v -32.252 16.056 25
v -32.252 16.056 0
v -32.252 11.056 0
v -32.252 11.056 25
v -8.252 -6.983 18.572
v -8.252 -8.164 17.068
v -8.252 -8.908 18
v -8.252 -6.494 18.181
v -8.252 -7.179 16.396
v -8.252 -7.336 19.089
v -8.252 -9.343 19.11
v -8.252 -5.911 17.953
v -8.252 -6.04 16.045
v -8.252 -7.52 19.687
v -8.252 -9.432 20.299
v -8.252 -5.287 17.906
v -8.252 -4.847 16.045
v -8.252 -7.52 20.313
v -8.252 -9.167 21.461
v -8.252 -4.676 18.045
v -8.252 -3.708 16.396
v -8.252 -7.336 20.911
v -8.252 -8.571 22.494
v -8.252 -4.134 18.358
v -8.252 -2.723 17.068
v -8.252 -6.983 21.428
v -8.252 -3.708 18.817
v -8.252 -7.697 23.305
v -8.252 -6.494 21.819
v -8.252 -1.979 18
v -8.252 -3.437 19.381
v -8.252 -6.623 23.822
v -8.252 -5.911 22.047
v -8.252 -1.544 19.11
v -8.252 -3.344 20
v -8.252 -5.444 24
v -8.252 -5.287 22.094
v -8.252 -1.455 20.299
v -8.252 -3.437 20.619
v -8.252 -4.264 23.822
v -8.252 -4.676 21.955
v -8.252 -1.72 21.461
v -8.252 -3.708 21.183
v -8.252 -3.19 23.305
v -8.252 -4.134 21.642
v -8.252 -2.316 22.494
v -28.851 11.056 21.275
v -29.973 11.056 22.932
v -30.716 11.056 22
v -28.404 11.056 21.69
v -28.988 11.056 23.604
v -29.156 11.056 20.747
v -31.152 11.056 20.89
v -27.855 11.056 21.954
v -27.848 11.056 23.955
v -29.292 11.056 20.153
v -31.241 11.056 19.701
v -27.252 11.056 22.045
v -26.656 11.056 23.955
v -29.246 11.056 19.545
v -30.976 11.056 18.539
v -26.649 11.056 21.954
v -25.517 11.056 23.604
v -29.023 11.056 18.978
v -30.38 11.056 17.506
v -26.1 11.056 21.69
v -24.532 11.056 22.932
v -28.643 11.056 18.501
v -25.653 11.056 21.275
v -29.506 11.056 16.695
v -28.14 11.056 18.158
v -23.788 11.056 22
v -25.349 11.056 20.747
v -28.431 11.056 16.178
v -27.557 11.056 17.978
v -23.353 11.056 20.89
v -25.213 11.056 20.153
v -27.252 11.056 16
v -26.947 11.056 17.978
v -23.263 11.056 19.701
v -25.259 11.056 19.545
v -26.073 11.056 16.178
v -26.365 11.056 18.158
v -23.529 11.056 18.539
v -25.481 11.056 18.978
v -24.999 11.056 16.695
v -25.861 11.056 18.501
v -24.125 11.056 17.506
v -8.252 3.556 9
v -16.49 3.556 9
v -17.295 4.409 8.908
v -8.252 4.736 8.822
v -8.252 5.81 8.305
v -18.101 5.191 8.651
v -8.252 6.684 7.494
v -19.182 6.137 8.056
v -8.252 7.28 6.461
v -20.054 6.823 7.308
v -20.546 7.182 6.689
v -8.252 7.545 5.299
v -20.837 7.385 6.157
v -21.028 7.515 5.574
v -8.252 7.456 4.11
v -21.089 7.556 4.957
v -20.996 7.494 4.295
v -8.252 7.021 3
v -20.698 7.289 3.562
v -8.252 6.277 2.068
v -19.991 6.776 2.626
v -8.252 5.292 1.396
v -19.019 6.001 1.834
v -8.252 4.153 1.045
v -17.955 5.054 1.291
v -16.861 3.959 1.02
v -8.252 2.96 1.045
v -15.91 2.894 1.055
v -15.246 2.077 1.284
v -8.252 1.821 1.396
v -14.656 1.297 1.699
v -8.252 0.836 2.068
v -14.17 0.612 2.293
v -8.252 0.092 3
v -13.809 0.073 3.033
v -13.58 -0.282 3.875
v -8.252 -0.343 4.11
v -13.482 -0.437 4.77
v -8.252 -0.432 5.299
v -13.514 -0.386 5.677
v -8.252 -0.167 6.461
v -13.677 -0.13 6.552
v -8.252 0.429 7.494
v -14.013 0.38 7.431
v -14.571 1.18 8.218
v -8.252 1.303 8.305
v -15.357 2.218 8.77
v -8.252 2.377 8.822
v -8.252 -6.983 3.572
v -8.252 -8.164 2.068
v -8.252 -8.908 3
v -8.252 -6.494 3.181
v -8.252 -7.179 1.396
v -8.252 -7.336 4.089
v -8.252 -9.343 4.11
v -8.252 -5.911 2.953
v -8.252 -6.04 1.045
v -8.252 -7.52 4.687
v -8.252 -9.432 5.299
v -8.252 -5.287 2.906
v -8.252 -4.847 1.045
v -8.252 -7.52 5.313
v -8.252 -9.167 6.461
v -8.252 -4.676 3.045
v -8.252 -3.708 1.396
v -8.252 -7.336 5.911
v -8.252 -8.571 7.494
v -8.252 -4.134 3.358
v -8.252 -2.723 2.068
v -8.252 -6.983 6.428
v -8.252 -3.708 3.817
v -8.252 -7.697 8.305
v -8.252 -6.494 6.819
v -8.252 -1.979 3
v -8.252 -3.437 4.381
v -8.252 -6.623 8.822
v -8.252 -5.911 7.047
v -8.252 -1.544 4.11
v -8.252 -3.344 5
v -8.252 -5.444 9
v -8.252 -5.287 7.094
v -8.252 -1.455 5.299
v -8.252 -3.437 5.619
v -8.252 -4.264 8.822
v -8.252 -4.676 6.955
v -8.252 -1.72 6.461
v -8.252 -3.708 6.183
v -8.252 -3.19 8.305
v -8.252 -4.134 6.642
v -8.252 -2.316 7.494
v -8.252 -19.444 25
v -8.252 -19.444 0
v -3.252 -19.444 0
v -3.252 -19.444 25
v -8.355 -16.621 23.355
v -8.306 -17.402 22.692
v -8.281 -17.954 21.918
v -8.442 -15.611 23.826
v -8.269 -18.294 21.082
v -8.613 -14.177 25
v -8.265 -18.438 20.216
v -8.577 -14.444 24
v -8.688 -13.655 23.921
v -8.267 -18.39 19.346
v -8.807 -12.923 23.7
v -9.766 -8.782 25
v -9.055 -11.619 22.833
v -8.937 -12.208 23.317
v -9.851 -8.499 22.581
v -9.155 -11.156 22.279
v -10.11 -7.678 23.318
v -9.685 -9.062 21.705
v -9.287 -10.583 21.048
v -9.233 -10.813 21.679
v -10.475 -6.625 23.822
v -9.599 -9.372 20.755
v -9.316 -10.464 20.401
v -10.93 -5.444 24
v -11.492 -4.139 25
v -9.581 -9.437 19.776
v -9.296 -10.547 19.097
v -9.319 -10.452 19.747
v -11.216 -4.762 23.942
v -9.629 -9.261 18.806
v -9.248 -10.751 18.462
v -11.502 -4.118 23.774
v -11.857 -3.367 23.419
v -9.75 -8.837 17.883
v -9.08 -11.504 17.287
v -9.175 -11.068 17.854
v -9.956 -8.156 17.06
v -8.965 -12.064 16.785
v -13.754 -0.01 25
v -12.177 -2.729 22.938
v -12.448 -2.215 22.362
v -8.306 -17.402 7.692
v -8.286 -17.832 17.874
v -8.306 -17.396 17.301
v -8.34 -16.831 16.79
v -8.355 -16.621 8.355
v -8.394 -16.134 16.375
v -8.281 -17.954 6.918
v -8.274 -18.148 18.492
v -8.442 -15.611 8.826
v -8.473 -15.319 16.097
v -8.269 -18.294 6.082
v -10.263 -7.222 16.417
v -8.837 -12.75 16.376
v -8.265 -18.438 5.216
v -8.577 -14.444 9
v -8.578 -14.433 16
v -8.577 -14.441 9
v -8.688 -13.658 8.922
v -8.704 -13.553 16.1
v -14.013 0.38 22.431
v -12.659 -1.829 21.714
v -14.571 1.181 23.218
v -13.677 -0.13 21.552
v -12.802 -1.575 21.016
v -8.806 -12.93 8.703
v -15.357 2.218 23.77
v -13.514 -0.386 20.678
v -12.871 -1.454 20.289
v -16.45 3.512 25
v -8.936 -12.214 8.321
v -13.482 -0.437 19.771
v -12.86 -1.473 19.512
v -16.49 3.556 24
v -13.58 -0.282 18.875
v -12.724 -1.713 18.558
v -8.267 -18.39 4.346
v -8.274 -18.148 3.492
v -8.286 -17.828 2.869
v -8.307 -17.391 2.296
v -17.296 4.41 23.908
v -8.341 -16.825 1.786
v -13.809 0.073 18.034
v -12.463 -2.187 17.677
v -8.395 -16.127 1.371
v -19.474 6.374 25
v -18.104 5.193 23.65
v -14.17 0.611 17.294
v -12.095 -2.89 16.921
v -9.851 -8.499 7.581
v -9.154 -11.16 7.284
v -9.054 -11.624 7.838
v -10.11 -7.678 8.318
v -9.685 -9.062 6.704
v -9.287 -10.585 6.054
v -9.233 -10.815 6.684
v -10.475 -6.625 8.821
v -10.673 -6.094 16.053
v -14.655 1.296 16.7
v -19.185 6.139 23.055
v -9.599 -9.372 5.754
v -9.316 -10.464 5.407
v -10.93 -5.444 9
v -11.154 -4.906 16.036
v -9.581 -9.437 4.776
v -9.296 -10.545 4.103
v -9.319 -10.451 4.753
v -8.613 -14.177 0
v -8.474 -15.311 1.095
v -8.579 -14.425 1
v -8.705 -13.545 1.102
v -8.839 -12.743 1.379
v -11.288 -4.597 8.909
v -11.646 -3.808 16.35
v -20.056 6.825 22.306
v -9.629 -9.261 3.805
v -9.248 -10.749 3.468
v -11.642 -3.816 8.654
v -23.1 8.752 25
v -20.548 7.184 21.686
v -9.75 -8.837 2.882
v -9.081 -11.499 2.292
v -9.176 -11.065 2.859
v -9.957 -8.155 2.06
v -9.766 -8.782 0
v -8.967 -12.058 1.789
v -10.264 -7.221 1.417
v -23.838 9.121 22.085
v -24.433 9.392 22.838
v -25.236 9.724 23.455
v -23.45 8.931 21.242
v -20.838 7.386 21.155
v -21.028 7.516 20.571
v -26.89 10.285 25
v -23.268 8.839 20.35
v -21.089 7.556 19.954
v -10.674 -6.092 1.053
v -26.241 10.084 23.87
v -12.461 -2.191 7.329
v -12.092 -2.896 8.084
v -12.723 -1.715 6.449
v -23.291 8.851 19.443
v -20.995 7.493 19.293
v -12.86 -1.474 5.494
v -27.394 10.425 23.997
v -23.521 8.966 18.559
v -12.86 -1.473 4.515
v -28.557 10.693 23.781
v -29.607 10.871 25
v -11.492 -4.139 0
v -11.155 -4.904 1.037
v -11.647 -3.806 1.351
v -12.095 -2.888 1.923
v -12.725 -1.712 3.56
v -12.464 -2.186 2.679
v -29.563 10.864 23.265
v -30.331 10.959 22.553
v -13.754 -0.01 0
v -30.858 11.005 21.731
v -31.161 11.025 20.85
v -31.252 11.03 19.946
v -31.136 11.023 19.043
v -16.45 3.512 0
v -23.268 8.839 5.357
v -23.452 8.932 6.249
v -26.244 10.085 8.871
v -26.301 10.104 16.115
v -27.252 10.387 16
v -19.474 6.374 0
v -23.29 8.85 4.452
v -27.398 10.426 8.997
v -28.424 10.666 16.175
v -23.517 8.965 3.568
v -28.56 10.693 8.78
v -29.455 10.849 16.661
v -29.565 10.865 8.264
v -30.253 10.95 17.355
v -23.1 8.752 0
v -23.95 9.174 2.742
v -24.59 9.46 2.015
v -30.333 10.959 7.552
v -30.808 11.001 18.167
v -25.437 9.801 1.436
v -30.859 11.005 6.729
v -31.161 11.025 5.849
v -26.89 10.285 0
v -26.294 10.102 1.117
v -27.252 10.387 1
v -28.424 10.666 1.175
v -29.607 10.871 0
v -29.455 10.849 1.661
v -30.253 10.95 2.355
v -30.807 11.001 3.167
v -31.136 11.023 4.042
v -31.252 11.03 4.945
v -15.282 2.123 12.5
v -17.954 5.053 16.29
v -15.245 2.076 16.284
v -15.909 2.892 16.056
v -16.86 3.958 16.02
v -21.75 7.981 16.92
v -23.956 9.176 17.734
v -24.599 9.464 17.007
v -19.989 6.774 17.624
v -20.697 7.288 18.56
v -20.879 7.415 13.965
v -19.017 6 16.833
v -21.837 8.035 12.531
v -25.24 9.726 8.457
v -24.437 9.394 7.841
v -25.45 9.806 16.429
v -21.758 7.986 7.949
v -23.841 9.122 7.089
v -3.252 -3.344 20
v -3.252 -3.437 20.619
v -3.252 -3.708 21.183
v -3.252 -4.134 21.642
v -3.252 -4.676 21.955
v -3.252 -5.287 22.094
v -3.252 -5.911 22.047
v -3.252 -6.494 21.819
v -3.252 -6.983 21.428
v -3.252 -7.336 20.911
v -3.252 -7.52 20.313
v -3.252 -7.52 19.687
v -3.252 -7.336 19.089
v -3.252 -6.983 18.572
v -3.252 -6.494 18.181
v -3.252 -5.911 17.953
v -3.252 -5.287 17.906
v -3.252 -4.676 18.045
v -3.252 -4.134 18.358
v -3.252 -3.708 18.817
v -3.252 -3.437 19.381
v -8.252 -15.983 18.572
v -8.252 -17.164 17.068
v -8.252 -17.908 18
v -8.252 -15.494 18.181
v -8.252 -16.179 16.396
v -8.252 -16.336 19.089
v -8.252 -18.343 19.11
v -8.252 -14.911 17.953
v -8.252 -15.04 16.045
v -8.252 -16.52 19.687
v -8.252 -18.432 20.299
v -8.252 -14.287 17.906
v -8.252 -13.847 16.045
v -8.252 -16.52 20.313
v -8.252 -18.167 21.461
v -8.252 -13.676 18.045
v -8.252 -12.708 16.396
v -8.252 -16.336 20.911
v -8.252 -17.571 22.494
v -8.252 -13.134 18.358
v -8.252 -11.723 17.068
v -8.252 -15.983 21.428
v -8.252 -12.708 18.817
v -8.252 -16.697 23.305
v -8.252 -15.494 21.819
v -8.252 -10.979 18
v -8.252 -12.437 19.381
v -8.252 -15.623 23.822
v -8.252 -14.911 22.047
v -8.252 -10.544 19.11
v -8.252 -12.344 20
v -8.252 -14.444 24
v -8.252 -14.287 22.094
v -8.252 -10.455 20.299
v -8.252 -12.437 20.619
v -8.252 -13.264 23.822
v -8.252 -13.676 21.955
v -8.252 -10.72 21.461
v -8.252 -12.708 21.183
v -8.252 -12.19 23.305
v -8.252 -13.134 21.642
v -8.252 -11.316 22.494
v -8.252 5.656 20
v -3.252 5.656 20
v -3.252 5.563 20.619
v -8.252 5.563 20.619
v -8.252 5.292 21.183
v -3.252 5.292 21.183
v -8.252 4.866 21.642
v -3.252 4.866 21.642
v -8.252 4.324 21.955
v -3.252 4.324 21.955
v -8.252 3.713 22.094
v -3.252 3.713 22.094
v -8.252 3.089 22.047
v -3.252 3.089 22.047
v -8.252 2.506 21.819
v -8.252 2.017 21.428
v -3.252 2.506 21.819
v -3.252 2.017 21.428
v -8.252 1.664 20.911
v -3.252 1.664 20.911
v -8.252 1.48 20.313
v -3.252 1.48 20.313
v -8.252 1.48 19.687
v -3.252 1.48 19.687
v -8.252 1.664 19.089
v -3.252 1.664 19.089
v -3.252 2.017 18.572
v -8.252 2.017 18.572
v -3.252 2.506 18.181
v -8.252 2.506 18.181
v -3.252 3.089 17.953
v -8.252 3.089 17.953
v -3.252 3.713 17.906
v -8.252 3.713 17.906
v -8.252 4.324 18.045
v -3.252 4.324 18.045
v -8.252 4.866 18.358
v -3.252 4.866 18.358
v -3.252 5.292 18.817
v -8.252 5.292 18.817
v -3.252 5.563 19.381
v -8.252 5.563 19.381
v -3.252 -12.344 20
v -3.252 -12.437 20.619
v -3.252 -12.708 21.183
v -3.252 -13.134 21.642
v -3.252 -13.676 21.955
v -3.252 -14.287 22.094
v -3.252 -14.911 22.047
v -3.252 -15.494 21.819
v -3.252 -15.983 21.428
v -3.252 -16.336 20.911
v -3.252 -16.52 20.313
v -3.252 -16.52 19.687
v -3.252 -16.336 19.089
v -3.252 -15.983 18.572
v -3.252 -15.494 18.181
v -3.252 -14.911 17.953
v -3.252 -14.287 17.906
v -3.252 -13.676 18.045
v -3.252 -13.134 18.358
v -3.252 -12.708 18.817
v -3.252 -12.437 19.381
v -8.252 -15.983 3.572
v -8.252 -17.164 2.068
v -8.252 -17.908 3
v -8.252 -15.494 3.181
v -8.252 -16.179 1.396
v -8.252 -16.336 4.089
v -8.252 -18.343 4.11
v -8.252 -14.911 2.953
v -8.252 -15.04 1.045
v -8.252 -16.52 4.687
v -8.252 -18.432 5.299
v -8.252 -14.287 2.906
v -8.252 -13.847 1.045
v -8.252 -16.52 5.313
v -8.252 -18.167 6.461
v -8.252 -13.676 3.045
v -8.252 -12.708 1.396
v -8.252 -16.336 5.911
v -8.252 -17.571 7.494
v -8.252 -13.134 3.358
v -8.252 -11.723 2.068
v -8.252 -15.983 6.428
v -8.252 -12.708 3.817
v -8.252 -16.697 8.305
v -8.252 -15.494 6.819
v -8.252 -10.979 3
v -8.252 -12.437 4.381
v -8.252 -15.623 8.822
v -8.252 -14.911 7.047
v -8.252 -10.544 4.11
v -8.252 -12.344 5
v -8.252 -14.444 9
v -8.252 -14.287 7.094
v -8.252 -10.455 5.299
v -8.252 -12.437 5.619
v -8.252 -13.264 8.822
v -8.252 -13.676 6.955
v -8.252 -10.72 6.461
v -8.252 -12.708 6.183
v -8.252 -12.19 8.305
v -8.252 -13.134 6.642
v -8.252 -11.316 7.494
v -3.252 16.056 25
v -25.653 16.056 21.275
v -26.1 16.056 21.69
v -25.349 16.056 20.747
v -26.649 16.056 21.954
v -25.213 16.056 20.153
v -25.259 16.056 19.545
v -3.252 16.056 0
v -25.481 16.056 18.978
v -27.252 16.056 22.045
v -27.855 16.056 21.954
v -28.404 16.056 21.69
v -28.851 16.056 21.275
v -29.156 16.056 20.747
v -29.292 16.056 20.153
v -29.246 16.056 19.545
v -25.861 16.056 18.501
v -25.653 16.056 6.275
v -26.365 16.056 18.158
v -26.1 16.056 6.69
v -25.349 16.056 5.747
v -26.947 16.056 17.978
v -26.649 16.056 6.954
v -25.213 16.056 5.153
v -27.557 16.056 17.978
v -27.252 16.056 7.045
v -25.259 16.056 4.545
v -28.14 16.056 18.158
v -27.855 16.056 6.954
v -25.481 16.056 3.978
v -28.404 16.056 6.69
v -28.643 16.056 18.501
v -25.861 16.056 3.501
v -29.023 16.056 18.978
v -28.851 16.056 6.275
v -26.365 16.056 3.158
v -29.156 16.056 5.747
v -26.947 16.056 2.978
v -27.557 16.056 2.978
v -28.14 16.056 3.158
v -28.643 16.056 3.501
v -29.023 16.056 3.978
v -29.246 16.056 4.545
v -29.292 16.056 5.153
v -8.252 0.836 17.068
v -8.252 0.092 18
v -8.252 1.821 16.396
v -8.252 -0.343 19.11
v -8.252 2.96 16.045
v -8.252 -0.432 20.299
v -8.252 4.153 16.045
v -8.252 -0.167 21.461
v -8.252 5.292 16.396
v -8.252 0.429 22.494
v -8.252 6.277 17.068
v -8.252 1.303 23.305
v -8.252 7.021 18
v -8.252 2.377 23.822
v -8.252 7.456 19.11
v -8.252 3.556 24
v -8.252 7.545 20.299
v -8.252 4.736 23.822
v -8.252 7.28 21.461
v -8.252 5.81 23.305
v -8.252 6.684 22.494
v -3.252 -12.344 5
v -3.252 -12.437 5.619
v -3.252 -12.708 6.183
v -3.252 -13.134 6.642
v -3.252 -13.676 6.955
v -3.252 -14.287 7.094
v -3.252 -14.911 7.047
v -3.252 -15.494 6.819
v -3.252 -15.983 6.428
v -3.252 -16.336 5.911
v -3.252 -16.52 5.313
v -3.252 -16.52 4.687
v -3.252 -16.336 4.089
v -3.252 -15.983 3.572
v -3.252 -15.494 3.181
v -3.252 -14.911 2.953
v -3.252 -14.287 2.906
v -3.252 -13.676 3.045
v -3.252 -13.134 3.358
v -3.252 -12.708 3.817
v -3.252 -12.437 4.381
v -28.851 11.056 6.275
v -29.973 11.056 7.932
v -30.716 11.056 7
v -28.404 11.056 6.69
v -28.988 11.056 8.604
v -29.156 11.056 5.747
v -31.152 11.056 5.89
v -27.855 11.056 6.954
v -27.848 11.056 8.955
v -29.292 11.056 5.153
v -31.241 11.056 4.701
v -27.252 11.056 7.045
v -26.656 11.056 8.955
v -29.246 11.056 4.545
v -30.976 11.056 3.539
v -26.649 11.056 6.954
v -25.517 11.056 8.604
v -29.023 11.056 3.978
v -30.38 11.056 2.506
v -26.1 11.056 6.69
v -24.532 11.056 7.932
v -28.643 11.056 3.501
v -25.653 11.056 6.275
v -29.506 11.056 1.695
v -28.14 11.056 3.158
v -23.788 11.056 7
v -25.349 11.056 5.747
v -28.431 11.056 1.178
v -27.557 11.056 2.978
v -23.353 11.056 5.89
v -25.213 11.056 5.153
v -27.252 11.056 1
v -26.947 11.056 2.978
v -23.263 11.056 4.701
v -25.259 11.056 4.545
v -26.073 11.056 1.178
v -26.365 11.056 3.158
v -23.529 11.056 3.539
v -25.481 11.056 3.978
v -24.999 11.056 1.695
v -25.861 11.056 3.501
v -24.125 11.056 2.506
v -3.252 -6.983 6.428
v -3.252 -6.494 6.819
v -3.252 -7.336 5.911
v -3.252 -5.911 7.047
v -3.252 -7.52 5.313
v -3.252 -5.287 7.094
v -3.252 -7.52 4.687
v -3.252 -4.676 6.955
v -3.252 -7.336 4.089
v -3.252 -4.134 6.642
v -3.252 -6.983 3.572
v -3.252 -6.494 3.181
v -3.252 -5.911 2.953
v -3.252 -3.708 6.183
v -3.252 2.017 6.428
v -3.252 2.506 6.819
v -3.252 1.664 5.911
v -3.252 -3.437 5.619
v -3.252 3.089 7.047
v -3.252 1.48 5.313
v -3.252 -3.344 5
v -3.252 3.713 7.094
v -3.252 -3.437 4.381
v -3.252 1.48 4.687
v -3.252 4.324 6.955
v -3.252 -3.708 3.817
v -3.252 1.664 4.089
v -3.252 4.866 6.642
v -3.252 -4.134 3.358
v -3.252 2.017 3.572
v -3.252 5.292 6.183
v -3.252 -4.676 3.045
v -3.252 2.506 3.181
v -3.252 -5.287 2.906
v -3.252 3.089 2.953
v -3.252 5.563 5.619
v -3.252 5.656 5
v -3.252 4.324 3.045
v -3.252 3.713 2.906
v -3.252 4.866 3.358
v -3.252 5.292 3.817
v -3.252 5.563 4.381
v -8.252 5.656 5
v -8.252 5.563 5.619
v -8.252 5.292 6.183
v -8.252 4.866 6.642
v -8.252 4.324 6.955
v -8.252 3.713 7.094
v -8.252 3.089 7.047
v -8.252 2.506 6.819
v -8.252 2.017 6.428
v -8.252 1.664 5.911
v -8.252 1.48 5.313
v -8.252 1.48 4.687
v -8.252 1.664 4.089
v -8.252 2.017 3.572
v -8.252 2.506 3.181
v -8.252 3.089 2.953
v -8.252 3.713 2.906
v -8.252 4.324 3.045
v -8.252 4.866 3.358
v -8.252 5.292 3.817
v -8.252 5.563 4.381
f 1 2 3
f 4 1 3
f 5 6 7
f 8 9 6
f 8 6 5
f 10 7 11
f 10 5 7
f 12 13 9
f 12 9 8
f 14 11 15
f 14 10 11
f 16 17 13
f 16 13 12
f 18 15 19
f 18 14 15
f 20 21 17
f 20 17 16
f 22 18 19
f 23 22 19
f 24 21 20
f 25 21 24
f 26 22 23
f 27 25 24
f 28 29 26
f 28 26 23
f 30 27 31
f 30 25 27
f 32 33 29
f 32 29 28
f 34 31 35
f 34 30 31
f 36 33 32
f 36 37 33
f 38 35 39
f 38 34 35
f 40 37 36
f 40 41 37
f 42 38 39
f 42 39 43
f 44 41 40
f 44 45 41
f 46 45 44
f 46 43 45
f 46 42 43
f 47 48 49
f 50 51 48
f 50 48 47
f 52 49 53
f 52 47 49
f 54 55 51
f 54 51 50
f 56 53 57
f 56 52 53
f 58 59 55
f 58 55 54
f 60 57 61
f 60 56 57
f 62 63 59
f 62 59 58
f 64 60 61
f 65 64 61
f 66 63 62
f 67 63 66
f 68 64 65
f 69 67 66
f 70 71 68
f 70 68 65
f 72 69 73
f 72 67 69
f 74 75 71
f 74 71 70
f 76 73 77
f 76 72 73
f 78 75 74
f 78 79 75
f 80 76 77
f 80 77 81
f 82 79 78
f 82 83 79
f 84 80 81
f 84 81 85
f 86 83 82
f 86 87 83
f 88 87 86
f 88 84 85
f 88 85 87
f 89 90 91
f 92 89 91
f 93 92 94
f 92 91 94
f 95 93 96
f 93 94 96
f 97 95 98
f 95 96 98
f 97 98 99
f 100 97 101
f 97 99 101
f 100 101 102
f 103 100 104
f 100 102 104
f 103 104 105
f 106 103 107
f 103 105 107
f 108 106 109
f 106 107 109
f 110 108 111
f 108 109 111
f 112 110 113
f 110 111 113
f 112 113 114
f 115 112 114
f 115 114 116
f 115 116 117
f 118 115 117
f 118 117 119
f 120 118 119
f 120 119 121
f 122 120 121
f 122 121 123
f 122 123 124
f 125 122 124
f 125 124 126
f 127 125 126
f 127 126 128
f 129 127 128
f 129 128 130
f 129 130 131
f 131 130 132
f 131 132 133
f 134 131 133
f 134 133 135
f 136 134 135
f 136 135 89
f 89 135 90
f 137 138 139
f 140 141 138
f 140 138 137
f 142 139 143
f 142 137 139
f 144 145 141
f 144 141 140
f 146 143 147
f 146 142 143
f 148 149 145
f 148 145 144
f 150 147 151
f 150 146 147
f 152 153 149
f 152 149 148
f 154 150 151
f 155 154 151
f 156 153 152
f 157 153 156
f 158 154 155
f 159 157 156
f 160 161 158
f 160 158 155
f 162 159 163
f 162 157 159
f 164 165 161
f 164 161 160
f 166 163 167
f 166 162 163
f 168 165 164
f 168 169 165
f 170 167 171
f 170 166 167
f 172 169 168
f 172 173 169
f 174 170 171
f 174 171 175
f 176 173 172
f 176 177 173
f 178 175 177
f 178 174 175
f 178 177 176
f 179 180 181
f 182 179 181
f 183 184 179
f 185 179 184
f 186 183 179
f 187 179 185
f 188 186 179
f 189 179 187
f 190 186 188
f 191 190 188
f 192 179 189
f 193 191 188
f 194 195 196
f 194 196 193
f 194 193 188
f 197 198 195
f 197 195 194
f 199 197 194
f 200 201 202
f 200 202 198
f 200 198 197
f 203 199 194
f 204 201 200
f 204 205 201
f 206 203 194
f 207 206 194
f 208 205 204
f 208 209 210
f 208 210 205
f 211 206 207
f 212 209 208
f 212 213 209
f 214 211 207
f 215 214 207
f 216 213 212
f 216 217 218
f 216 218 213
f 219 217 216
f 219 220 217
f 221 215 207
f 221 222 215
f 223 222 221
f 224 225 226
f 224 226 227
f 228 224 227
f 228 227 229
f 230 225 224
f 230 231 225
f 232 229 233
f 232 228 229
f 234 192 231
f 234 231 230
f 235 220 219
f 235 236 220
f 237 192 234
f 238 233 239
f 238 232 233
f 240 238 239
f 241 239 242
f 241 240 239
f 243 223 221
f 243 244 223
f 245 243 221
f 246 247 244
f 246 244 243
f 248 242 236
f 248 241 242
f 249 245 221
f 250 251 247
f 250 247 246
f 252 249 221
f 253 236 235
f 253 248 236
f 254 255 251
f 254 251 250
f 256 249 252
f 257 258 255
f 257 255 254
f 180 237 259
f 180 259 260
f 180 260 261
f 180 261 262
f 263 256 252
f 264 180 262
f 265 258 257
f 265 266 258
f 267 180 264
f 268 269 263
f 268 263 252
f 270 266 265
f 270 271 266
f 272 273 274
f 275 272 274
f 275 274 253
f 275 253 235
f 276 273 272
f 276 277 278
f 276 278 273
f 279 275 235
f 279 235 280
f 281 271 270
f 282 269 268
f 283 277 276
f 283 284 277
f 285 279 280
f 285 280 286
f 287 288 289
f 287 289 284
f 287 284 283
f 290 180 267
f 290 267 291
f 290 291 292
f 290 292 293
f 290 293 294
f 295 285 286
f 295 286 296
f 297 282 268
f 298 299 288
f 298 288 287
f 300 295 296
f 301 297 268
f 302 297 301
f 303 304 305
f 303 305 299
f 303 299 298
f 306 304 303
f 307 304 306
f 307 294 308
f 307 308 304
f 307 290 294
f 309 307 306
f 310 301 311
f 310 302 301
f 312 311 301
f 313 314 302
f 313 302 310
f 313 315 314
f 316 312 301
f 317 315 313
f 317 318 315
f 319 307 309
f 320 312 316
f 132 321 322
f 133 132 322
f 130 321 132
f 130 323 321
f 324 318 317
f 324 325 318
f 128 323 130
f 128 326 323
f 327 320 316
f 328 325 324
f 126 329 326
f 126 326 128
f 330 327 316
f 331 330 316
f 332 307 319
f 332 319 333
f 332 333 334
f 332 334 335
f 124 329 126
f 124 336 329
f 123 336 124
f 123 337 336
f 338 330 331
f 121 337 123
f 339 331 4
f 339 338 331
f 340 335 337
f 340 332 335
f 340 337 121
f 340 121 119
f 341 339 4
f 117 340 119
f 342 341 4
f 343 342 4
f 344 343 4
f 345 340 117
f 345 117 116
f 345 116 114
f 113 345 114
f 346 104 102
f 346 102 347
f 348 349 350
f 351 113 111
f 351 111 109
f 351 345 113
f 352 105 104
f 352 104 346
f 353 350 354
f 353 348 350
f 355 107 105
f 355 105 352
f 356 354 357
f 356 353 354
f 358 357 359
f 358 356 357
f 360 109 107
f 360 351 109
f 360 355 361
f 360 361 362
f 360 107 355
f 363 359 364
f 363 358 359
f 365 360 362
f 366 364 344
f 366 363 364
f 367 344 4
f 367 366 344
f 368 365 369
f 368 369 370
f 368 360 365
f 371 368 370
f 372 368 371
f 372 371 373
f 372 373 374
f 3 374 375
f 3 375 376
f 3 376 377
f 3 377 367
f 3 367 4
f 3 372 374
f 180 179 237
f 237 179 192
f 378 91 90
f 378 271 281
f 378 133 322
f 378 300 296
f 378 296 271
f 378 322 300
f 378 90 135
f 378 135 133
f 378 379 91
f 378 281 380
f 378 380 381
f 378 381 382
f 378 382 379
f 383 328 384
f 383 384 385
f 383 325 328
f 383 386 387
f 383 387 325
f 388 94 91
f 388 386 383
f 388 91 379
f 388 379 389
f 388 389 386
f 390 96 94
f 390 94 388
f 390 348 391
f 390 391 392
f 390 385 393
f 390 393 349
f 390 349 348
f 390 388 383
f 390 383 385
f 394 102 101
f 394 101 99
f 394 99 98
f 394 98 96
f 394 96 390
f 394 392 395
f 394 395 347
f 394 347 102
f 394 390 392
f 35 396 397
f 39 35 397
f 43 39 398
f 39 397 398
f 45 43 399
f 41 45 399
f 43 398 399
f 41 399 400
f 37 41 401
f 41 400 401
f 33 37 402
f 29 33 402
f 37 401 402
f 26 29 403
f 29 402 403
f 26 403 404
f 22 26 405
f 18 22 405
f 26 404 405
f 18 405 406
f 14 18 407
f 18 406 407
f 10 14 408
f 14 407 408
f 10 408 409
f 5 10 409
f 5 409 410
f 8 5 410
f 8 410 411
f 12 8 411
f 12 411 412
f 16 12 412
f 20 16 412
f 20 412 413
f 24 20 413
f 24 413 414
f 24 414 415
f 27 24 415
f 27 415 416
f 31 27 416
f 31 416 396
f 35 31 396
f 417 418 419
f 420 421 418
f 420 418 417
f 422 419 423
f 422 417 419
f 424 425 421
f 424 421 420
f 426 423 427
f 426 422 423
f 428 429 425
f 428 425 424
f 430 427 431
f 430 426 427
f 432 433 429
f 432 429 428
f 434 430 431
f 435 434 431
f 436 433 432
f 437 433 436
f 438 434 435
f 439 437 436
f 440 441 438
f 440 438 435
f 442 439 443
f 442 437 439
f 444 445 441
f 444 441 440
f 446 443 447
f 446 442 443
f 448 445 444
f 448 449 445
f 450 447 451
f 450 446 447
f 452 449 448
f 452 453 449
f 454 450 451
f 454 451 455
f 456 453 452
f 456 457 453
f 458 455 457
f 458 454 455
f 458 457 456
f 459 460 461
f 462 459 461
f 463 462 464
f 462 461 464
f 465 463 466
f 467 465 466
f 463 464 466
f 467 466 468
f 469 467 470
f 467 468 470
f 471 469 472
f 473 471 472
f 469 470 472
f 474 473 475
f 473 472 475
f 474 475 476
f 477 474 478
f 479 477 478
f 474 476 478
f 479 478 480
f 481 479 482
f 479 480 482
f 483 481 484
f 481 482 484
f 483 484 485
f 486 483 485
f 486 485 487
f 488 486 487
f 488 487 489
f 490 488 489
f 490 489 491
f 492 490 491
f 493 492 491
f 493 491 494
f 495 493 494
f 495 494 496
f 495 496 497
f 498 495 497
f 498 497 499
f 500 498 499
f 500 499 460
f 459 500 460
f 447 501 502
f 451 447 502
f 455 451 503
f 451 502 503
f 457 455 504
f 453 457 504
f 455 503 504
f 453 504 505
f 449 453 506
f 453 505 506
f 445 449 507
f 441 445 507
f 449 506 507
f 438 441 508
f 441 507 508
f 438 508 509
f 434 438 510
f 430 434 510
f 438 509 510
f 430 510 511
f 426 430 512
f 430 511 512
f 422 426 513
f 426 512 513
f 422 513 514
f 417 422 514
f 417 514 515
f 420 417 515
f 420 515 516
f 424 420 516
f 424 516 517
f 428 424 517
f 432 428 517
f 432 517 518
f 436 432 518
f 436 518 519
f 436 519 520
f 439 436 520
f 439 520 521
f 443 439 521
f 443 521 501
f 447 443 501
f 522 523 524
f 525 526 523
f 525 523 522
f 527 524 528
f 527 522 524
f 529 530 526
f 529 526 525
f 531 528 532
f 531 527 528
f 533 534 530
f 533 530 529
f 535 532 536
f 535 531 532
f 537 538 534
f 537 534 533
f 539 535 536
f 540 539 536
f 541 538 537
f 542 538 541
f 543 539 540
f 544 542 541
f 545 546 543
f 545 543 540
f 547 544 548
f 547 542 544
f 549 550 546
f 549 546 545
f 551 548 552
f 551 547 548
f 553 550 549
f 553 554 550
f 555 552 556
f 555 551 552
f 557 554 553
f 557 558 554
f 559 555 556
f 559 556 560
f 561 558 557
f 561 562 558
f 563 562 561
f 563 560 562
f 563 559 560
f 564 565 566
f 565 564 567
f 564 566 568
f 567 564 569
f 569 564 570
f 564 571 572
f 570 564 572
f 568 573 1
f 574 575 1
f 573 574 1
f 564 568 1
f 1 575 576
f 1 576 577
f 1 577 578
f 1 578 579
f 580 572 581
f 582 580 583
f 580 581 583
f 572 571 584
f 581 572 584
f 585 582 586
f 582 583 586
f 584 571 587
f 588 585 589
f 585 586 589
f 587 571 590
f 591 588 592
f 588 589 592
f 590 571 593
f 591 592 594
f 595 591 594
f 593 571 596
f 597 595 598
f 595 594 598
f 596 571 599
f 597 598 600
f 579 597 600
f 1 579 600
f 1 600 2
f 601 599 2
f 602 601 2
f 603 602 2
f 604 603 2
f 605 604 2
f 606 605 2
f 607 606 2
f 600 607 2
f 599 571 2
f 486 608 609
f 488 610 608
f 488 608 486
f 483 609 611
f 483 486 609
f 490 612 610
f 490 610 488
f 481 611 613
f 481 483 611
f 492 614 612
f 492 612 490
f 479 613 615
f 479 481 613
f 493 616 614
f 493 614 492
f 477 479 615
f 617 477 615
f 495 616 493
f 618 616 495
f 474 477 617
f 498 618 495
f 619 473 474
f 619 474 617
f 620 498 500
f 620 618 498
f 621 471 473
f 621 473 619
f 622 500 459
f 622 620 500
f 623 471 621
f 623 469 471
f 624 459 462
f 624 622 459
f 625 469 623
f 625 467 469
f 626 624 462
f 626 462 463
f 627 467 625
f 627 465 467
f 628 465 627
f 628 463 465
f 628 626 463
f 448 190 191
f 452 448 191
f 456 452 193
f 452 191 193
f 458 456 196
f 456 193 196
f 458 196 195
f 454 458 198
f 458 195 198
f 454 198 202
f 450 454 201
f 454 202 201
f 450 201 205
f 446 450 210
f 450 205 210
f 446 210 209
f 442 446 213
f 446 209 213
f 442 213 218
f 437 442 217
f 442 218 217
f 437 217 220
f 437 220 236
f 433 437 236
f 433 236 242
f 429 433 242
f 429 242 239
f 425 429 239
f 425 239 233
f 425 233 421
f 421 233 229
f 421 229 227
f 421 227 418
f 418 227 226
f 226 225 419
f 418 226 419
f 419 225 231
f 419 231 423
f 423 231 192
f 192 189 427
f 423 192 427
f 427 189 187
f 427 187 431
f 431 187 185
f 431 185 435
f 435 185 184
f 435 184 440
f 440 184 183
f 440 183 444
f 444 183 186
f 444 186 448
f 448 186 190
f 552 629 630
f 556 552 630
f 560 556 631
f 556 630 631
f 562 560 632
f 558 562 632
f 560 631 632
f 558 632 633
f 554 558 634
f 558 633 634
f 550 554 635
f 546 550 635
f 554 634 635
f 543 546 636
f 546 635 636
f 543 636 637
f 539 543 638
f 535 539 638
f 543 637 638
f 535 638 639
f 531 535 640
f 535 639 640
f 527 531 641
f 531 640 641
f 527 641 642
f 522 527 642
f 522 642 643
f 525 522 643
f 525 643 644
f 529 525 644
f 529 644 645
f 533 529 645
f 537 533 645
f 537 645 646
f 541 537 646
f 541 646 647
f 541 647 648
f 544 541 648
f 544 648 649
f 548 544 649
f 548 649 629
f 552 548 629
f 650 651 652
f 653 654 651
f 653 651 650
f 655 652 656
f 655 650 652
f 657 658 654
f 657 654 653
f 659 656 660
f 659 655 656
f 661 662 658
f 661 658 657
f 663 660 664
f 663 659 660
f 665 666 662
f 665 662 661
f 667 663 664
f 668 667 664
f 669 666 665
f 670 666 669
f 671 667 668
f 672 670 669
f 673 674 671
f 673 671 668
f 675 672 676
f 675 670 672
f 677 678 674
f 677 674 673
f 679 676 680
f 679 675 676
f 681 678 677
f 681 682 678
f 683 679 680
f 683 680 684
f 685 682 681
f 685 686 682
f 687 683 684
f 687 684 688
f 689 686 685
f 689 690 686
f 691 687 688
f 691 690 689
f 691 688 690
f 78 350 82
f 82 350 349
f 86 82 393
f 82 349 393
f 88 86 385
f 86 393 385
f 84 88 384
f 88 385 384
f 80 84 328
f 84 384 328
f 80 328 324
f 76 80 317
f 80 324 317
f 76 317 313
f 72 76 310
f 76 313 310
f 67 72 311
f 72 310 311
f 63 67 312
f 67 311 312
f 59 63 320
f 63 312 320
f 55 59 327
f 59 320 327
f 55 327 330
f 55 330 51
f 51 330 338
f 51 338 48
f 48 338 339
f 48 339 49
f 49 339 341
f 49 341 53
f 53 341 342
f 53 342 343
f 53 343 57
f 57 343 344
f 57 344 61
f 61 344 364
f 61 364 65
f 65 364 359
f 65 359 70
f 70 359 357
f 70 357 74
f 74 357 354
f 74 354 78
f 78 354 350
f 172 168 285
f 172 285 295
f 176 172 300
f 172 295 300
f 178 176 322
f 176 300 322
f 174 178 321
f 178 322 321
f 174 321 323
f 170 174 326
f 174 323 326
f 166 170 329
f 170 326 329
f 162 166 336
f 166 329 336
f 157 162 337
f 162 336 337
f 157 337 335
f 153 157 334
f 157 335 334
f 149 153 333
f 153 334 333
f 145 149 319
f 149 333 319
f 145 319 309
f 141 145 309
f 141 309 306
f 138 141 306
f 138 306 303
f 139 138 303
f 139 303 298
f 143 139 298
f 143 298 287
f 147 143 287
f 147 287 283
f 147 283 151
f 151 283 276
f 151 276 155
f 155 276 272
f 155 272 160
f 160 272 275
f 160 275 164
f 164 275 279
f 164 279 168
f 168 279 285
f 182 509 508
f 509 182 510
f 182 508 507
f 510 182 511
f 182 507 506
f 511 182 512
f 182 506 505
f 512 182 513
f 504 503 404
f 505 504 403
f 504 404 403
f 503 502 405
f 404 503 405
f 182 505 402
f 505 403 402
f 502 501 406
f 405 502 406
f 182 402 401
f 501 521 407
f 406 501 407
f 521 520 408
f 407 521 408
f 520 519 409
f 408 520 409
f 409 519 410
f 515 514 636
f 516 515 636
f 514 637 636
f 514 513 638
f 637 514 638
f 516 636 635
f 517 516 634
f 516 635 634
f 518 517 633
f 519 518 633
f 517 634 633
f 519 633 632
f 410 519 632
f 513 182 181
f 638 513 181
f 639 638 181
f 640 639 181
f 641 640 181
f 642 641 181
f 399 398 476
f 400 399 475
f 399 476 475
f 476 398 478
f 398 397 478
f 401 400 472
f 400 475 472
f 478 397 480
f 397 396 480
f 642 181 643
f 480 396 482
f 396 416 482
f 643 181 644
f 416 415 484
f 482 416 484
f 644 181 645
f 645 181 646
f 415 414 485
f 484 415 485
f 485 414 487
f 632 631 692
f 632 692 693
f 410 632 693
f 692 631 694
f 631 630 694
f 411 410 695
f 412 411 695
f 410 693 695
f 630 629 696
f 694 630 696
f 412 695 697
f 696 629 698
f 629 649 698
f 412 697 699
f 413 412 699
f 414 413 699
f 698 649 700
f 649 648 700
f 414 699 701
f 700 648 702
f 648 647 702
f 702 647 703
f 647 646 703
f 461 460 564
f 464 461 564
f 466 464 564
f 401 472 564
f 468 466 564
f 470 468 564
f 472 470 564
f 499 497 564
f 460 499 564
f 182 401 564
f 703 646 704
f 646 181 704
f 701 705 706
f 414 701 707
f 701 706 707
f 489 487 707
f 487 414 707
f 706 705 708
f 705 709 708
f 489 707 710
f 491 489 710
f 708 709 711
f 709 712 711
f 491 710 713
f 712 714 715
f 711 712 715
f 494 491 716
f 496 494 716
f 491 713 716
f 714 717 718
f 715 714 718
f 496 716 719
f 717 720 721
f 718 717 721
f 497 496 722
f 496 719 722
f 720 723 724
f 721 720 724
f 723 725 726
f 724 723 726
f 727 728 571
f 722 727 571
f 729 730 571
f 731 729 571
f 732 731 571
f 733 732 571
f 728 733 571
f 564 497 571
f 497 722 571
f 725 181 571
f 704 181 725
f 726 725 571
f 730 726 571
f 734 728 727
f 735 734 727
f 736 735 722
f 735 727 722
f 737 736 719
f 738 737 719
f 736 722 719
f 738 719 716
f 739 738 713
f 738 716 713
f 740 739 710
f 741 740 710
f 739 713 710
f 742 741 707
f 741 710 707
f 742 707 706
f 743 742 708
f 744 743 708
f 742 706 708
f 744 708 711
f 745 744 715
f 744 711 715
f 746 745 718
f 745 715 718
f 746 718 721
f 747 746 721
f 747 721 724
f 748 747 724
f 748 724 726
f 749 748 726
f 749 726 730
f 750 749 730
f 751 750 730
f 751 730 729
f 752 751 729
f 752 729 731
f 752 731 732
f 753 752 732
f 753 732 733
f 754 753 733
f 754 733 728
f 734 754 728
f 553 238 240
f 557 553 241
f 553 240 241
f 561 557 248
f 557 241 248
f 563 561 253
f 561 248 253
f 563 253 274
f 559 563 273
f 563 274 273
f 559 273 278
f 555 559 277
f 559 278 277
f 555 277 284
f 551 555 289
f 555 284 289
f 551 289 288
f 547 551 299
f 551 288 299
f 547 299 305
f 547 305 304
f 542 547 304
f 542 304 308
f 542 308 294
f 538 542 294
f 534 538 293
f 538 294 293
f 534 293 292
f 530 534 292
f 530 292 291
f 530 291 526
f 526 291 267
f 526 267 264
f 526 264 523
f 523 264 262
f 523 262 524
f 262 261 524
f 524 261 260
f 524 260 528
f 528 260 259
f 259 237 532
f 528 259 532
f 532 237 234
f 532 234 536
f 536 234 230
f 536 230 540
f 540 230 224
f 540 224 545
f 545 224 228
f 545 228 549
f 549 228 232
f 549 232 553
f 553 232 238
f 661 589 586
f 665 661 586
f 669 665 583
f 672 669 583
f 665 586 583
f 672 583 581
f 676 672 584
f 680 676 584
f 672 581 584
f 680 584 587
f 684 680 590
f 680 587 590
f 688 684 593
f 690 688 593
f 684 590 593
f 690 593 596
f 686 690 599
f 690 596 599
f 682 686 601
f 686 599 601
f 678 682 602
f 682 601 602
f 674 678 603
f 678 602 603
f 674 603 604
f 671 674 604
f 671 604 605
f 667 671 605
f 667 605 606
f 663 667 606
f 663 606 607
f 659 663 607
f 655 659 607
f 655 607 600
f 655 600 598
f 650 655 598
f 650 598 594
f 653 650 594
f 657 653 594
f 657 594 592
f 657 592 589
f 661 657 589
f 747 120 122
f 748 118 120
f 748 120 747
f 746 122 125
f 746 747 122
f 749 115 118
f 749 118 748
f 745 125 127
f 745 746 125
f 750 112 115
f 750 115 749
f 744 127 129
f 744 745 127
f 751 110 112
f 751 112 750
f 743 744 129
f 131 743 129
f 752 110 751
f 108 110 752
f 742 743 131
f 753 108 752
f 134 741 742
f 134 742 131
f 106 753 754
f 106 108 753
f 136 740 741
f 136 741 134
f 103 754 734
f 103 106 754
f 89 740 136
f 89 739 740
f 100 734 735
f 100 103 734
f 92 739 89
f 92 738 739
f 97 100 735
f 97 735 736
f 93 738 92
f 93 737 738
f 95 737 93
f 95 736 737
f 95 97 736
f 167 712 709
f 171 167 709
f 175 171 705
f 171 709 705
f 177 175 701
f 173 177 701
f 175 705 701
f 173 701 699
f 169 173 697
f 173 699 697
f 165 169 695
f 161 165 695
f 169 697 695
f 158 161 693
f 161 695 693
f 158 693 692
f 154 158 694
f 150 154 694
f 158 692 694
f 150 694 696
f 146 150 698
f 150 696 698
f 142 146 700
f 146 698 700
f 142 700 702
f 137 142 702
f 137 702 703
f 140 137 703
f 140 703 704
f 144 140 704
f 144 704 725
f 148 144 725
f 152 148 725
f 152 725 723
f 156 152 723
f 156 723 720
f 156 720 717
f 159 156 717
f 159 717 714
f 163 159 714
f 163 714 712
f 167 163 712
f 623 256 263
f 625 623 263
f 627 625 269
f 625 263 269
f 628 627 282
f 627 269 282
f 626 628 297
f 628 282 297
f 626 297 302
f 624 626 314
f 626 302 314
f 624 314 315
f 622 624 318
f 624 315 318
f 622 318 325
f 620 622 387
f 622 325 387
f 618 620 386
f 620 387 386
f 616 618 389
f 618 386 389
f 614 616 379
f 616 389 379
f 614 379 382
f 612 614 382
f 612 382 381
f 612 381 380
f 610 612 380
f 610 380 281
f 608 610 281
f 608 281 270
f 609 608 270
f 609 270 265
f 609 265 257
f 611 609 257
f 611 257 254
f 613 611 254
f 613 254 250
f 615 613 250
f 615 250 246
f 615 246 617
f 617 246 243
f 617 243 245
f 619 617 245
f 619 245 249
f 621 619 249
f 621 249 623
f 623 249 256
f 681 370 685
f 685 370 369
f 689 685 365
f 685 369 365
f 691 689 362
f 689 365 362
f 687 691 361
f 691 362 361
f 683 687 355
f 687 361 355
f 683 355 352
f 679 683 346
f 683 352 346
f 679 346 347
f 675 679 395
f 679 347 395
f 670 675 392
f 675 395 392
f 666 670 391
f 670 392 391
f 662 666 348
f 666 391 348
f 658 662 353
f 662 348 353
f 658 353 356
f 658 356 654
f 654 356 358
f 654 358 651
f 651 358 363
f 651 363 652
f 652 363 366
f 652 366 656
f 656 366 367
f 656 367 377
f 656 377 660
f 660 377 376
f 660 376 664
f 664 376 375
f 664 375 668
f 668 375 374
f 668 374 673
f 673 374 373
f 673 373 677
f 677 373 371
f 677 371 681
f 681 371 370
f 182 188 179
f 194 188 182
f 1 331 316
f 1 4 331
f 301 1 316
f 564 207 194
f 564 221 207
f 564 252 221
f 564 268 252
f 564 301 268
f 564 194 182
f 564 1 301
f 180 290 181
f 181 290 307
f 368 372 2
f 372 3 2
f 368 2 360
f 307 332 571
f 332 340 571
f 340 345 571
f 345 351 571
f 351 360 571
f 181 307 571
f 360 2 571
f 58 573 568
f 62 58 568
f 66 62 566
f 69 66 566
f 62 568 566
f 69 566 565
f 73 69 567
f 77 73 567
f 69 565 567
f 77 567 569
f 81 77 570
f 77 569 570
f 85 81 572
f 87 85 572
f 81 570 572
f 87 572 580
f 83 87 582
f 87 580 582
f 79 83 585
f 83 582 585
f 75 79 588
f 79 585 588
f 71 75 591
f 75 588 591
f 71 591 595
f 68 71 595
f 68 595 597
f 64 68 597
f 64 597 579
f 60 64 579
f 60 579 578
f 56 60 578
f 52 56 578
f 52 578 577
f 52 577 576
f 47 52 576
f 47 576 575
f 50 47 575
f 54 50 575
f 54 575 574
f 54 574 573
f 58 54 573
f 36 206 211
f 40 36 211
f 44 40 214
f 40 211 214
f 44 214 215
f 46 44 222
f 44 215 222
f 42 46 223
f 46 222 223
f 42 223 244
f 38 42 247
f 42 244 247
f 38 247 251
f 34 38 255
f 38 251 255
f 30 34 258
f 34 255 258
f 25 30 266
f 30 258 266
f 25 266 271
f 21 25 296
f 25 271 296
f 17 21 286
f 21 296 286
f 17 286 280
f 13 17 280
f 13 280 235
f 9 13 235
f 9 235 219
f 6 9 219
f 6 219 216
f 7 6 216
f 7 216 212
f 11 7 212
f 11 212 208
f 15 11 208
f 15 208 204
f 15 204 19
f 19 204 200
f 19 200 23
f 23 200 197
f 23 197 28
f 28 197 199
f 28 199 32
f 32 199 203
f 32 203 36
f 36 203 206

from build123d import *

# Parameters (mm, degrees)
EXTRUDE_1_DEPTH     = 25
SKETCH_2_R          = 2.1
CUT_EXTRUDE_1_DEPTH = 25
SKETCH_4_R          = 4
CUT_EXTRUDE_2_DEPTH = 24
SKETCH_5_R          = 2.044965575
CUT_EXTRUDE_3_DEPTH = 24
SKETCH_6_R          = 4
CUT_EXTRUDE_4_DEPTH = 30.5


with BuildPart() as part:
    # 草圖1 → 填料-伸長1 (new body)
    with BuildSketch(Plane.XY):
        with BuildLine():
            Line((-3.252259835, 16.056494785), (-32.252259835, 16.056494785))
            Line((-32.252259835, 16.056494785), (-32.252259835, 11.056494785))
            add(Edge.make_bspline(
                [(-8.252259835, -19.443505215), (-8.252259835, 11.056494785), (-32.252259835, 11.056494785)],
                knots=[4.71238898, 4.71238898, 4.71238898, 6.283185307, 6.283185307, 6.283185307], degree=2, weights=[1, 0.707106781, 1]))
            Line((-8.252259835, -19.443505215), (-3.252259835, -19.443505215))
            Line((-3.252259835, -19.443505215), (-3.252259835, 16.056494785))
        make_face()
    extrude(amount=EXTRUDE_1_DEPTH)

    # 草圖2 → 除料-伸長1 (cut)
    with BuildSketch(Plane(origin=(-3.252259835, 0, 0), x_dir=(0, 0, -1), z_dir=(1, 0, 0))):
        with Locations(Location((-20, -14.443505215, 0), (0, 0, 90))):
            Circle(SKETCH_2_R)
        with Locations(Location((-5, -14.443505215, 0), (0, 0, 90))):
            Circle(SKETCH_2_R)
        with Locations(Location((-5, -5.443505215, 0), (0, 0, 90))):
            Circle(SKETCH_2_R)
        with Locations(Location((-5, 3.556494785, 0), (0, 0, 90))):
            Circle(SKETCH_2_R)
        with Locations(Location((-20, -5.443505215, 0), (0, 0, 90))):
            Circle(SKETCH_2_R)
        with Locations(Location((-20, 3.556494785, 0), (0, 0, 90))):
            Circle(SKETCH_2_R)
    extrude(amount=-CUT_EXTRUDE_1_DEPTH, mode=Mode.SUBTRACT)

    # 草圖4 → 除料-伸長2 (cut)
    with BuildSketch(Plane.ZY.offset(32.252259835)):
        with Locations((5, 3.556494785)):
            Circle(SKETCH_4_R)
        with Locations((20, 3.556494785)):
            Circle(SKETCH_4_R)
        with Locations((20, -5.443505215)):
            Circle(SKETCH_4_R)
        with Locations((20, -14.443505215)):
            Circle(SKETCH_4_R)
        with Locations((5, -5.443505215)):
            Circle(SKETCH_4_R)
        with Locations((5, -14.443505215)):
            Circle(SKETCH_4_R)
    extrude(amount=-CUT_EXTRUDE_2_DEPTH, mode=Mode.SUBTRACT)

    # 草圖5 → 除料-伸長3 (cut)
    with BuildSketch(Plane(origin=(0, 16.056494785, 0), x_dir=(1, 0, 0), z_dir=(0, 1, 0))):
        with Locations(Location((-27.252259835, -5, 0), (0, 0, 270))):
            Circle(SKETCH_5_R)
        with Locations(Location((-27.252259835, -20, 0), (0, 0, 270))):
            Circle(SKETCH_5_R)
    extrude(amount=-CUT_EXTRUDE_3_DEPTH, mode=Mode.SUBTRACT)

    # 草圖6 → 除料-伸長4 (cut)
    with BuildSketch(Plane.XZ.offset(19.443505215)):
        with Locations(Location((-27.252259835, 5, 0), (0, 0, 270))):
            Circle(SKETCH_6_R)
        with Locations(Location((-27.252259835, 20, 0), (0, 0, 270))):
            Circle(SKETCH_6_R)
    extrude(amount=-CUT_EXTRUDE_4_DEPTH, mode=Mode.SUBTRACT)


solid = part.part
